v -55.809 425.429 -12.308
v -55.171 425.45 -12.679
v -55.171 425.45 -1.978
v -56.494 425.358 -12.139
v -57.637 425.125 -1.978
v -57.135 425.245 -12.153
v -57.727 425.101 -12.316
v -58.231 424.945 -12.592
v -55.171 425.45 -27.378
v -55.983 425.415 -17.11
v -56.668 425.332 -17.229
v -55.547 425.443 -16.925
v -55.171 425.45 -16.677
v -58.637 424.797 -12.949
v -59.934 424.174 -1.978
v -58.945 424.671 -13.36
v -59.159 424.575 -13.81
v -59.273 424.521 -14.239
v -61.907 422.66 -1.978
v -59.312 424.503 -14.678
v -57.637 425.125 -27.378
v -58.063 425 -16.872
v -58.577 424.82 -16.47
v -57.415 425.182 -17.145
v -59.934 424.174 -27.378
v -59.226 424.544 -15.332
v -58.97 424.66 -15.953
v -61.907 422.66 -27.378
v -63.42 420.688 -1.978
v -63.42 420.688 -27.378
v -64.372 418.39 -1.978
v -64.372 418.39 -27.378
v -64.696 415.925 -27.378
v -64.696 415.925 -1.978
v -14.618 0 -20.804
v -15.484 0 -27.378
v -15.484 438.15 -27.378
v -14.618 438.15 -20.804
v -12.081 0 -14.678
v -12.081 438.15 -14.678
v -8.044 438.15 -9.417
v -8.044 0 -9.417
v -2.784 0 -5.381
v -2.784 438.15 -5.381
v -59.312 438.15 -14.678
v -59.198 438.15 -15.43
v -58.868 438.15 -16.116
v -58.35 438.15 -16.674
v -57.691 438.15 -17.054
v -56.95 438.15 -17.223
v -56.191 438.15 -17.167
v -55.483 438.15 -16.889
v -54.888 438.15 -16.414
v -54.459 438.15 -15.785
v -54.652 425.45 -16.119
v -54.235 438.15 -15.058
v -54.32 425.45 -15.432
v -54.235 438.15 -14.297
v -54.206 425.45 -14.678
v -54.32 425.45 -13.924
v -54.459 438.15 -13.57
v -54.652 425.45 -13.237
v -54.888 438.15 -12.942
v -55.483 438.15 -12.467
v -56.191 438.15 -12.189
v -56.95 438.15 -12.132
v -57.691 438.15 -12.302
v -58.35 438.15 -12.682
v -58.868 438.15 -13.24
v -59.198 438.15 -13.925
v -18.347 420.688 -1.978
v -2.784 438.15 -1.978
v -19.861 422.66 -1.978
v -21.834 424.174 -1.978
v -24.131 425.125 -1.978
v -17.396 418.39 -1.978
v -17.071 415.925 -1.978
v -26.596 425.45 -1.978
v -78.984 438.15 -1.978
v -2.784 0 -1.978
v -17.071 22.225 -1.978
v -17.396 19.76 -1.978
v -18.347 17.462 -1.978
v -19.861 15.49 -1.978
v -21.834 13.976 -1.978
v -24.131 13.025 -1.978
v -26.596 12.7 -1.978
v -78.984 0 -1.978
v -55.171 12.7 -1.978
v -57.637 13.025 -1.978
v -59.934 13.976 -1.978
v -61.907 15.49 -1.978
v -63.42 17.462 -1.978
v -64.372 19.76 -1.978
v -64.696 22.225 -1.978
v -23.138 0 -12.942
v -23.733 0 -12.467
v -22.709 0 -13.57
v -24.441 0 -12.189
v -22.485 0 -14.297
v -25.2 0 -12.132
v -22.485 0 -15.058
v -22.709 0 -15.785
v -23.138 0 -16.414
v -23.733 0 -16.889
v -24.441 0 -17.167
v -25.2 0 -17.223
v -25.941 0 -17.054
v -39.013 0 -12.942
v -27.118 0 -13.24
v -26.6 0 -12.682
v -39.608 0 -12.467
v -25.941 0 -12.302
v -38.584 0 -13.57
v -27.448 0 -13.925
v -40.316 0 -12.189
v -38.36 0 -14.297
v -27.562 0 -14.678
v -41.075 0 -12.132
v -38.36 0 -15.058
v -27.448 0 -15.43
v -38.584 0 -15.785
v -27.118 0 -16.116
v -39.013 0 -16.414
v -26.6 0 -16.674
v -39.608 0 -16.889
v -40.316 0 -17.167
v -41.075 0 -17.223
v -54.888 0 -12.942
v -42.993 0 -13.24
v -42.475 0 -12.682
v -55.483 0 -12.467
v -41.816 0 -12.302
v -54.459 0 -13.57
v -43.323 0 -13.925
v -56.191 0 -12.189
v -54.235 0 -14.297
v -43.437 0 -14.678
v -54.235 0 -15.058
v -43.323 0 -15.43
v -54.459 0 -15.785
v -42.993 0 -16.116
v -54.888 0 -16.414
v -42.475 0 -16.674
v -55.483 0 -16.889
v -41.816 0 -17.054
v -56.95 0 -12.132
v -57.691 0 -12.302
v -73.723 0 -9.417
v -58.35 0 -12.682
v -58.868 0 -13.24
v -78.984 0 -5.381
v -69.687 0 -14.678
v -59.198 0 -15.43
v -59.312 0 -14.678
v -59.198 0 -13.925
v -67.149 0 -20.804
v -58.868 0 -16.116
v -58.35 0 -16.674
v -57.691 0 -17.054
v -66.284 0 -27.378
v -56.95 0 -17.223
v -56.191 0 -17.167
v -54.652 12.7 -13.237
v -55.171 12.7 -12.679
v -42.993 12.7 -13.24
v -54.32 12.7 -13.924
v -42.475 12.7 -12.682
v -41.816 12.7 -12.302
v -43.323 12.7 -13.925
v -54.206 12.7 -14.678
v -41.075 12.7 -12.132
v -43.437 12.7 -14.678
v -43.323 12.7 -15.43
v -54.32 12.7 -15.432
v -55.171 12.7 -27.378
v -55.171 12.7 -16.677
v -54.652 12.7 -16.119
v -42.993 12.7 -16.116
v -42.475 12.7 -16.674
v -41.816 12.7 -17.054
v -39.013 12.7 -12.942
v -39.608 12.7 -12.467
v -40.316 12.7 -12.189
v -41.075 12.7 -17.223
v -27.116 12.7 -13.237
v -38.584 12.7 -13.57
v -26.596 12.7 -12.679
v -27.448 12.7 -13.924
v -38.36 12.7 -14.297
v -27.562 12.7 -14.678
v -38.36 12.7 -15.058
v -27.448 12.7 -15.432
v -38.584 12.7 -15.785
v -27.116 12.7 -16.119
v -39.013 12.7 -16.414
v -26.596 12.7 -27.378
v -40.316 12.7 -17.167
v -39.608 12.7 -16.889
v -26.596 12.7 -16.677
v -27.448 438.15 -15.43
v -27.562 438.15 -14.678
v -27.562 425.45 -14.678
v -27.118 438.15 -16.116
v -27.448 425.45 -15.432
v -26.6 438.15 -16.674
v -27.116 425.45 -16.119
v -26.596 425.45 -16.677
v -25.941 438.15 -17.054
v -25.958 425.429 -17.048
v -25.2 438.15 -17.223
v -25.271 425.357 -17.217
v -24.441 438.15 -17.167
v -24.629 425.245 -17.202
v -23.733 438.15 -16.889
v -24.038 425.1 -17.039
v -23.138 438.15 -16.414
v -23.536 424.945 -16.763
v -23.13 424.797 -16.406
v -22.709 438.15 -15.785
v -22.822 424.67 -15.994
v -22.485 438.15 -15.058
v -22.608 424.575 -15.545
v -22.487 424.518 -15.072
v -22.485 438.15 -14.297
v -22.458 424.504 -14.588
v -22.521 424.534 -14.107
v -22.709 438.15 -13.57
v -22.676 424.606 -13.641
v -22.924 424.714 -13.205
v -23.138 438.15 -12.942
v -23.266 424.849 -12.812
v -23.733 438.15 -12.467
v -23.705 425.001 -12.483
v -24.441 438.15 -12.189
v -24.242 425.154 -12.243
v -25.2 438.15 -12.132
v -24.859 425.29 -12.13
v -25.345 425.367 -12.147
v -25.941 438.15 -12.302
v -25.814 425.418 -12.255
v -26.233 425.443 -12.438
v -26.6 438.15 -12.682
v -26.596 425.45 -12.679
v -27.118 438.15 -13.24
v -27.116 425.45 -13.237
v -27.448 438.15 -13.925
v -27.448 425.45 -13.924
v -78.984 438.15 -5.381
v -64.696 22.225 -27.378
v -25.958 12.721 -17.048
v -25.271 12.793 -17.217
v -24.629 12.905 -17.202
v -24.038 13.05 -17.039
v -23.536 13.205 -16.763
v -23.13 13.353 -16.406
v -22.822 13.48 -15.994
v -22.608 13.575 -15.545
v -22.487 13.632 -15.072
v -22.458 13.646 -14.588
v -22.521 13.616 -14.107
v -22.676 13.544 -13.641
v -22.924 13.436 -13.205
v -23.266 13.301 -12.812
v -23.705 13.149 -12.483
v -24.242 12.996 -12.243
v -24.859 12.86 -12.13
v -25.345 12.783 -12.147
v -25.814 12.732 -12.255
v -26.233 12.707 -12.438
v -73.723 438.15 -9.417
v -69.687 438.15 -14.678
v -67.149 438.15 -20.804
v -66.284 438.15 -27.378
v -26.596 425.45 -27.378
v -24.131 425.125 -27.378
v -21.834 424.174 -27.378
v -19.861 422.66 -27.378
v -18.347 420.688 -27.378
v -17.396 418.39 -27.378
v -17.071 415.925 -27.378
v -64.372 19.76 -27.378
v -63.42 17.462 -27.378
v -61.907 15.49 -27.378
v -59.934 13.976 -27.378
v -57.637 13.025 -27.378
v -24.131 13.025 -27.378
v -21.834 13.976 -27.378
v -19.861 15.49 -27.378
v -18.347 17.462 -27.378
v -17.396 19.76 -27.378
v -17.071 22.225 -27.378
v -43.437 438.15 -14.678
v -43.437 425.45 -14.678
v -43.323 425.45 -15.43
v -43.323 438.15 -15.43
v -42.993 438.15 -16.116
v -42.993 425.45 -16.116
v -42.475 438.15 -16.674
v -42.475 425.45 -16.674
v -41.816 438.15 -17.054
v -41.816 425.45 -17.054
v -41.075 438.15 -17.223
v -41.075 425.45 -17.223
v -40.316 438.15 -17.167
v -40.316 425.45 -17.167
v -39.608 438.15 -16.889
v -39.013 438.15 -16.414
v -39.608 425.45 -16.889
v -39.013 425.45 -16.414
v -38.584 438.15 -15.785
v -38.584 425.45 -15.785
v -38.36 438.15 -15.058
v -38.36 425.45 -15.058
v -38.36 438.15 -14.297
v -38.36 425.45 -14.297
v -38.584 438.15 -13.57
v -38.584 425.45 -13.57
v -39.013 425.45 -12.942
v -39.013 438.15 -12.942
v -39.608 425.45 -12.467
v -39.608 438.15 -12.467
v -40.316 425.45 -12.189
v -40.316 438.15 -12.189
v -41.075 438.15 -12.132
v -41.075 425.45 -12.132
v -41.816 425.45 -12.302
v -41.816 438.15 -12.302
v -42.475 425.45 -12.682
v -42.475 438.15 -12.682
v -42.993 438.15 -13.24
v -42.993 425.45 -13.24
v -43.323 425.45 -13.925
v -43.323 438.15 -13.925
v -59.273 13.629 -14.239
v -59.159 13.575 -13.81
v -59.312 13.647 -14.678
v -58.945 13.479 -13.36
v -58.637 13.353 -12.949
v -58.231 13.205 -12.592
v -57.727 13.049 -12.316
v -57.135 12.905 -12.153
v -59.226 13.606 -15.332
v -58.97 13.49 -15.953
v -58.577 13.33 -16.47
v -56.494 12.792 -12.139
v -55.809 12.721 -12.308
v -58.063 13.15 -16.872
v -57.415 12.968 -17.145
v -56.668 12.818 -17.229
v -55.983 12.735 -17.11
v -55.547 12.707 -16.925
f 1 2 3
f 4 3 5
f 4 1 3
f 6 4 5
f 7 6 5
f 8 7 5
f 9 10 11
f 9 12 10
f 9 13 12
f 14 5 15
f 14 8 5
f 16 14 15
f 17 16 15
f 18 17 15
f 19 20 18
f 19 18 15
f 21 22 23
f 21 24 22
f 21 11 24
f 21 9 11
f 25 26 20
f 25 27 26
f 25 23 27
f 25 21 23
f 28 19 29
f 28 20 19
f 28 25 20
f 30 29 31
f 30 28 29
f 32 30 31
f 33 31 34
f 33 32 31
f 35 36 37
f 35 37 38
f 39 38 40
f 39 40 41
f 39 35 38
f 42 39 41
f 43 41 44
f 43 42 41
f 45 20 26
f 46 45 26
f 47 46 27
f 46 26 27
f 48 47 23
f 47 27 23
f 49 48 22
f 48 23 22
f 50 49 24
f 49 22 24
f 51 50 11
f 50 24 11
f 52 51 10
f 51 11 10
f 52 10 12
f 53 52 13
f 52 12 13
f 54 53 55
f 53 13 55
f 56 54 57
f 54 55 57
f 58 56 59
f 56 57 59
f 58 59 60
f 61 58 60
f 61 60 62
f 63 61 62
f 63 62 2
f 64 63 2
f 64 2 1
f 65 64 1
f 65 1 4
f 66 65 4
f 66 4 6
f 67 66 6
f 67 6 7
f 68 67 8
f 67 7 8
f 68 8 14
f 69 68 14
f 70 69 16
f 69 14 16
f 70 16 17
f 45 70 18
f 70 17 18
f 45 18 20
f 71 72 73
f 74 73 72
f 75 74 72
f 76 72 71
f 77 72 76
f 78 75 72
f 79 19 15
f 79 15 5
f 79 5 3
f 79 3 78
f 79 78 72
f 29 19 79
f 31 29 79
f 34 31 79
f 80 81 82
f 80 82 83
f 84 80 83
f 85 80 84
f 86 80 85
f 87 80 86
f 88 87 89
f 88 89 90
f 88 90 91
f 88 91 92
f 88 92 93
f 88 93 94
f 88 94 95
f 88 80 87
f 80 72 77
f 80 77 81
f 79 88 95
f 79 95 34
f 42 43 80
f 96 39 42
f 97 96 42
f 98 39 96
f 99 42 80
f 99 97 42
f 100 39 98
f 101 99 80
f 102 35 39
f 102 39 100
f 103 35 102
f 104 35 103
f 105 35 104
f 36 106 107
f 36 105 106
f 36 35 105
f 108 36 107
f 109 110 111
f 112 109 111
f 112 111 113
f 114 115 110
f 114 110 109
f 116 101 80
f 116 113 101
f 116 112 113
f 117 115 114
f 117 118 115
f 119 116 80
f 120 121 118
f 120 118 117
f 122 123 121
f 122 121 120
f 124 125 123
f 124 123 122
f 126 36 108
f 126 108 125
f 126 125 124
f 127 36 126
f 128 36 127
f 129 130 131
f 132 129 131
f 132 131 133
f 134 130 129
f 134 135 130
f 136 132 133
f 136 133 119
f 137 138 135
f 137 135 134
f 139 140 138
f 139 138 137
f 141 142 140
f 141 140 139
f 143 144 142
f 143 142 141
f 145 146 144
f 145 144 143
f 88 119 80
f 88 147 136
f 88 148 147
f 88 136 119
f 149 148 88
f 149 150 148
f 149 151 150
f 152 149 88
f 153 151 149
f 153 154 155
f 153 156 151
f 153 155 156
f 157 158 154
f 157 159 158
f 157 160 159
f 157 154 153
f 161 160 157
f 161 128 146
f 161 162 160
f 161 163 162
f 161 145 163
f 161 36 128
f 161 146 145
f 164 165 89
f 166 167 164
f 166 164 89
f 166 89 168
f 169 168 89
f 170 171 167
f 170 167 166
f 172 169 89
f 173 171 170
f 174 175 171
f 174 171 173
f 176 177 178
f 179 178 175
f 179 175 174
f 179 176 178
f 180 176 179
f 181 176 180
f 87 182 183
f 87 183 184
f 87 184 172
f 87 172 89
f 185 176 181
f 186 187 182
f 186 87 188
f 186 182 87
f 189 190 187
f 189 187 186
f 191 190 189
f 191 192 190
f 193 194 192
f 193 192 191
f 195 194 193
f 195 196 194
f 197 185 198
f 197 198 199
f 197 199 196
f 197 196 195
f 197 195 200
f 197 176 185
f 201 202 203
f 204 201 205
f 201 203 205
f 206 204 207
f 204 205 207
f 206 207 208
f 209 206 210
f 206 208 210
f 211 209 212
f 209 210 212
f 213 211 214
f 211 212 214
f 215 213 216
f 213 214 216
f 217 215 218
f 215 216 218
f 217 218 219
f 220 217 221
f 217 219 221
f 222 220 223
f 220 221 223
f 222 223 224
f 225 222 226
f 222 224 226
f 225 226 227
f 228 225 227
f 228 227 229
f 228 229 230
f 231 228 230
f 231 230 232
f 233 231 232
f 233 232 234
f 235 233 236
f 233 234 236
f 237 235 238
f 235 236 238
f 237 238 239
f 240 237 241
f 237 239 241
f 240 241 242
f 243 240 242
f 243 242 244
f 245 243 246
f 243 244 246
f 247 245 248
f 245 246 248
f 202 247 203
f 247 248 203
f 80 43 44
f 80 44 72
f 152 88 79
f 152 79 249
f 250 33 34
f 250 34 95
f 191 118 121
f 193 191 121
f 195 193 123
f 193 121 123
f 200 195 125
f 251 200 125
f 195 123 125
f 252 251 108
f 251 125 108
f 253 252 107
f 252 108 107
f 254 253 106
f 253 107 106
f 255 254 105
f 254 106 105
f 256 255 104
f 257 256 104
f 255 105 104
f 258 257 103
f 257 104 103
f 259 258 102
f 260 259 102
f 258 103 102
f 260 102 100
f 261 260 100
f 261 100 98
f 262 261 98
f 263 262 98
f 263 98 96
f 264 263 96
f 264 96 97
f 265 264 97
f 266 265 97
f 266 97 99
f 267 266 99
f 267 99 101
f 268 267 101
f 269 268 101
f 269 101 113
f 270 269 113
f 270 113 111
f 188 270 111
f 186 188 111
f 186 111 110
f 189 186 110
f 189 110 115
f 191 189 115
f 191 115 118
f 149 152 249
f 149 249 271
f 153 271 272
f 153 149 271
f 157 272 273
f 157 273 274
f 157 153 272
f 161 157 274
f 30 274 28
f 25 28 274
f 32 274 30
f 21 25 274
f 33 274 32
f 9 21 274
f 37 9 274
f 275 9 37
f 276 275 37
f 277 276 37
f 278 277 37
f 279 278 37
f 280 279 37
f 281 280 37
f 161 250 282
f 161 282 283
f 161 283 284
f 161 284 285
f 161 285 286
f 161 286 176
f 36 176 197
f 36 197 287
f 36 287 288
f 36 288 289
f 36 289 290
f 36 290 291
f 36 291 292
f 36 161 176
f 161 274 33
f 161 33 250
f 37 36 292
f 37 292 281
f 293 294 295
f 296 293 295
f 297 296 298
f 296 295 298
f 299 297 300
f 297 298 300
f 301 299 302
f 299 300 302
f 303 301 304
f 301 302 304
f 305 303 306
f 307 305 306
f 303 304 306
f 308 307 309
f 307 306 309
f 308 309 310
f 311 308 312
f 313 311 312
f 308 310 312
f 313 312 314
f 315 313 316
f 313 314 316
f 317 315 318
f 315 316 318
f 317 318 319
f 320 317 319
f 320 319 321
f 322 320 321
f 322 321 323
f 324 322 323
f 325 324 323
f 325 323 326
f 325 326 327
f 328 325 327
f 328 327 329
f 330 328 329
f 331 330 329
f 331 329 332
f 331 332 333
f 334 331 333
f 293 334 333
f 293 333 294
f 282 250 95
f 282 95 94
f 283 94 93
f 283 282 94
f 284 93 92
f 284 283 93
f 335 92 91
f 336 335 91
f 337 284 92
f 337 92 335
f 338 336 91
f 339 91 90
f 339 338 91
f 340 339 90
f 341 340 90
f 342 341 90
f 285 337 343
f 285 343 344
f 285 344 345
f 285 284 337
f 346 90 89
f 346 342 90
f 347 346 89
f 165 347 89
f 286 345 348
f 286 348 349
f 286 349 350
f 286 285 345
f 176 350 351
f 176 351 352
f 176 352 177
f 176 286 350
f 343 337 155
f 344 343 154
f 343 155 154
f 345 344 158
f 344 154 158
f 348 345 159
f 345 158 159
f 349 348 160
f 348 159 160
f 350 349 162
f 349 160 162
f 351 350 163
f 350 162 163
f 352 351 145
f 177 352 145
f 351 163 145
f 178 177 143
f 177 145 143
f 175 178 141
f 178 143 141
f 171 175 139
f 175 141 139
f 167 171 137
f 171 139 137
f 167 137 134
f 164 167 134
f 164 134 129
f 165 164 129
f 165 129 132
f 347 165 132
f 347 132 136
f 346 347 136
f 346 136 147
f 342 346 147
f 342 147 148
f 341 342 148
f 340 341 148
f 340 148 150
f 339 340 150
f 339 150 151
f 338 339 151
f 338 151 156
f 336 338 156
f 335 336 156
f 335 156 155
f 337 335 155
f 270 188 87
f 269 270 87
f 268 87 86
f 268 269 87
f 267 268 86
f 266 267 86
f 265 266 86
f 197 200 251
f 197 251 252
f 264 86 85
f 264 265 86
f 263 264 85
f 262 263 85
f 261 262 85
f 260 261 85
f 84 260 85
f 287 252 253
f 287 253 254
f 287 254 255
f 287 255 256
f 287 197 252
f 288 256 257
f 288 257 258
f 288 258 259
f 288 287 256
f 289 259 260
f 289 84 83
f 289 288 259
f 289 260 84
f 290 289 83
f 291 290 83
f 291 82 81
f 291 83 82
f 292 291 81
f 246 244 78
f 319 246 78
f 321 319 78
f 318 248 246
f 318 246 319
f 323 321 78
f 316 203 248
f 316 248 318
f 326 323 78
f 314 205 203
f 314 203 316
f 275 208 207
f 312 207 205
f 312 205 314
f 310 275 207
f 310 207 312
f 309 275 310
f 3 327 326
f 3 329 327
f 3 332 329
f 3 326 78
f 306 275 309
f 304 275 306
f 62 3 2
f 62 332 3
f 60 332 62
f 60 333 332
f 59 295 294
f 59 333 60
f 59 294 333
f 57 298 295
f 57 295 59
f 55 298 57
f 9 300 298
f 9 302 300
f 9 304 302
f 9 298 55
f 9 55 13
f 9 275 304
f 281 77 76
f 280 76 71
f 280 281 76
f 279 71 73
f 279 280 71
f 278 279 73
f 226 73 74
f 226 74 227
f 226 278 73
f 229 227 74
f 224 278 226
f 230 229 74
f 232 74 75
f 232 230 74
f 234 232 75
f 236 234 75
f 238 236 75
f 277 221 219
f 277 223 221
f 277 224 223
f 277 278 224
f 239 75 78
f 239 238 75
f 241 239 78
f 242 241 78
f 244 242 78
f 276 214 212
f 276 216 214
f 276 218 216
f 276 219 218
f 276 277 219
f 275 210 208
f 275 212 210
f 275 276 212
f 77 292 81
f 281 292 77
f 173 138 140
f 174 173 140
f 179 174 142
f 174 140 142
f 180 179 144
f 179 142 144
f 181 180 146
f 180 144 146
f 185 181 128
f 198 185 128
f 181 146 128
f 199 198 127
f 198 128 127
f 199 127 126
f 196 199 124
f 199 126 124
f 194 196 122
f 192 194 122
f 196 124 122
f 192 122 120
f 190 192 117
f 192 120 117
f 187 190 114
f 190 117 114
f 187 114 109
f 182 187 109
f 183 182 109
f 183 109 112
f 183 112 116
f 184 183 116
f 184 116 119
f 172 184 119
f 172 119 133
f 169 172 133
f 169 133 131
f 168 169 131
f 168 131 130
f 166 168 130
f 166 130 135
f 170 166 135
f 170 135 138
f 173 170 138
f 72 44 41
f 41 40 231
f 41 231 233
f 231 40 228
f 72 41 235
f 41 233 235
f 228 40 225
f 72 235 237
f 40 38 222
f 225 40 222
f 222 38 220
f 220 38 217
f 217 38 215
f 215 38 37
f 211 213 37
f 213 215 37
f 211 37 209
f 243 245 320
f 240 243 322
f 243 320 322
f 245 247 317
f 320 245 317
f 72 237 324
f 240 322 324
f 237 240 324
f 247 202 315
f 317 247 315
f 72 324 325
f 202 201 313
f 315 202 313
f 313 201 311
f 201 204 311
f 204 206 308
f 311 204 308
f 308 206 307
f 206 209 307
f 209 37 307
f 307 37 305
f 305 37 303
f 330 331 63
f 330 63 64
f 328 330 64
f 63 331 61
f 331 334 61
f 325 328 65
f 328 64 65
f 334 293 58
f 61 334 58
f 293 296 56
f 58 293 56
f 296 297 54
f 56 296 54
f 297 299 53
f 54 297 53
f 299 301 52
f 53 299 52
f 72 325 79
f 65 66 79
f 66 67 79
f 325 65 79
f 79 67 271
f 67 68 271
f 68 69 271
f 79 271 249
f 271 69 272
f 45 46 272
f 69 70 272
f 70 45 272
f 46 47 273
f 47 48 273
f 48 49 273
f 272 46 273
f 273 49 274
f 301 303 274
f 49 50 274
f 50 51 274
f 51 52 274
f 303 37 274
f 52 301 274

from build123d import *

# Parameters (mm, degrees)
BOSS_EXTRUDE2_DEPTH          = 438.15
CUT_EXTRUDE1_DEPTH           = 446.936132759
F_1_4_20_TAPPED_HOLE1_REACH  = 448.053
F_1_4_20_TAPPED_HOLE1_BORE_R = 2.5527
F_1_4_20_TAPPED_HOLE2_D      = 5.1054


with BuildPart() as part:
    # Sketch1 → Boss-Extrude2 (new body)
    with BuildSketch(Plane(origin=(0, 0, 0), x_dir=(1, 0, 0), z_dir=(0, 1, 0))):
        with BuildLine():
            Line((-66.283871769, 27.377862638), (-15.483871769, 27.377862638))
            ThreePointArc((-15.483871769, 27.377862638), (-12.080917025, 14.677862638), (-2.783871769, 5.380817382))
            Line((-2.783871769, 5.380817382), (-2.783871769, 1.977862638))
            Line((-2.783871769, 1.977862638), (-78.983871769, 1.977862638))
            Line((-78.983871769, 1.977862638), (-78.983871769, 5.380817382))
            ThreePointArc((-78.983871769, 5.380817382), (-69.686826513, 14.677862638), (-66.283871769, 27.377862638))
        make_face()
    extrude(amount=BOSS_EXTRUDE2_DEPTH)

    # Sketch6 → Cut-Extrude1 (cut, through all)
    with BuildSketch(Plane(origin=(0, 0, -27.377862638), x_dir=(-1, 0, 0), z_dir=(0, 0, -1))):
        with BuildLine():
            Line((26.596371769, 425.45), (55.171371769, 425.45))
            ThreePointArc((55.171371769, 425.45), (61.90656386, 422.660192091), (64.696371769, 415.925))
            Line((64.696371769, 415.925), (64.696371769, 22.225))
            ThreePointArc((64.696371769, 22.225), (61.90656386, 15.489807909), (55.171371769, 12.7))
            Line((55.171371769, 12.7), (26.596371769, 12.7))
            ThreePointArc((26.596371769, 12.7), (19.861179678, 15.489807909), (17.071371769, 22.225))
            Line((17.071371769, 22.225), (17.071371769, 415.925))
            ThreePointArc((17.071371769, 415.925), (19.861179678, 422.660192091), (26.596371769, 425.45))
        make_face()
    extrude(amount=-CUT_EXTRUDE1_DEPTH, mode=Mode.SUBTRACT)

    # 1/4-20 Tapped Hole1 bore → 1/4-20 Tapped Hole1 (cut, up to next)
    with BuildSketch(Plane(origin=(0, 0, 0), x_dir=(-1, 0, 0), z_dir=(0, -1, 0)), mode=Mode.PRIVATE) as f_1_4_20_tapped_hole1_sk1:
        with Locations((40.883871769, 14.677862638)):
            Circle(F_1_4_20_TAPPED_HOLE1_BORE_R)
    f_1_4_20_tapped_hole1_tool1 = extrude(f_1_4_20_tapped_hole1_sk1.sketch, amount=-F_1_4_20_TAPPED_HOLE1_REACH, mode=Mode.PRIVATE) & part.part
    # 1/4-20 Tapped Hole1 bore → 1/4-20 Tapped Hole1 (cut, up to next)
    with BuildSketch(Plane(origin=(0, 0, 0), x_dir=(-1, 0, 0), z_dir=(0, -1, 0)), mode=Mode.PRIVATE) as f_1_4_20_tapped_hole1_sk2:
        with Locations((56.758871769, 14.677862638)):
            Circle(F_1_4_20_TAPPED_HOLE1_BORE_R)
    f_1_4_20_tapped_hole1_tool2 = extrude(f_1_4_20_tapped_hole1_sk2.sketch, amount=-F_1_4_20_TAPPED_HOLE1_REACH, mode=Mode.PRIVATE) & part.part
    # 1/4-20 Tapped Hole1 bore → 1/4-20 Tapped Hole1 (cut, up to next)
    with BuildSketch(Plane(origin=(0, 0, 0), x_dir=(-1, 0, 0), z_dir=(0, -1, 0)), mode=Mode.PRIVATE) as f_1_4_20_tapped_hole1_sk3:
        with Locations((25.008871769, 14.677862638)):
            Circle(F_1_4_20_TAPPED_HOLE1_BORE_R)
    f_1_4_20_tapped_hole1_tool3 = extrude(f_1_4_20_tapped_hole1_sk3.sketch, amount=-F_1_4_20_TAPPED_HOLE1_REACH, mode=Mode.PRIVATE) & part.part
    add(f_1_4_20_tapped_hole1_tool1.solids().sort_by_distance((-40.883872, 0, -14.677863))[0], mode=Mode.SUBTRACT)
    add(f_1_4_20_tapped_hole1_tool2.solids().sort_by_distance((-56.758872, 0, -14.677863))[0], mode=Mode.SUBTRACT)
    add(f_1_4_20_tapped_hole1_tool3.solids().sort_by_distance((-25.008872, 0, -14.677863))[0], mode=Mode.SUBTRACT)

    # 1/4-20 Tapped Hole2 (through all)
    with Locations(Plane(origin=(0, 438.15, 0), x_dir=(1, 0, 0), z_dir=(0, 1, 0))):
        with Locations((-56.758871769, 14.677862638), (-40.883871769, 14.677862638), (-25.008871769, 14.677862638)):
            Hole(F_1_4_20_TAPPED_HOLE2_D / 2)


solid = part.part
